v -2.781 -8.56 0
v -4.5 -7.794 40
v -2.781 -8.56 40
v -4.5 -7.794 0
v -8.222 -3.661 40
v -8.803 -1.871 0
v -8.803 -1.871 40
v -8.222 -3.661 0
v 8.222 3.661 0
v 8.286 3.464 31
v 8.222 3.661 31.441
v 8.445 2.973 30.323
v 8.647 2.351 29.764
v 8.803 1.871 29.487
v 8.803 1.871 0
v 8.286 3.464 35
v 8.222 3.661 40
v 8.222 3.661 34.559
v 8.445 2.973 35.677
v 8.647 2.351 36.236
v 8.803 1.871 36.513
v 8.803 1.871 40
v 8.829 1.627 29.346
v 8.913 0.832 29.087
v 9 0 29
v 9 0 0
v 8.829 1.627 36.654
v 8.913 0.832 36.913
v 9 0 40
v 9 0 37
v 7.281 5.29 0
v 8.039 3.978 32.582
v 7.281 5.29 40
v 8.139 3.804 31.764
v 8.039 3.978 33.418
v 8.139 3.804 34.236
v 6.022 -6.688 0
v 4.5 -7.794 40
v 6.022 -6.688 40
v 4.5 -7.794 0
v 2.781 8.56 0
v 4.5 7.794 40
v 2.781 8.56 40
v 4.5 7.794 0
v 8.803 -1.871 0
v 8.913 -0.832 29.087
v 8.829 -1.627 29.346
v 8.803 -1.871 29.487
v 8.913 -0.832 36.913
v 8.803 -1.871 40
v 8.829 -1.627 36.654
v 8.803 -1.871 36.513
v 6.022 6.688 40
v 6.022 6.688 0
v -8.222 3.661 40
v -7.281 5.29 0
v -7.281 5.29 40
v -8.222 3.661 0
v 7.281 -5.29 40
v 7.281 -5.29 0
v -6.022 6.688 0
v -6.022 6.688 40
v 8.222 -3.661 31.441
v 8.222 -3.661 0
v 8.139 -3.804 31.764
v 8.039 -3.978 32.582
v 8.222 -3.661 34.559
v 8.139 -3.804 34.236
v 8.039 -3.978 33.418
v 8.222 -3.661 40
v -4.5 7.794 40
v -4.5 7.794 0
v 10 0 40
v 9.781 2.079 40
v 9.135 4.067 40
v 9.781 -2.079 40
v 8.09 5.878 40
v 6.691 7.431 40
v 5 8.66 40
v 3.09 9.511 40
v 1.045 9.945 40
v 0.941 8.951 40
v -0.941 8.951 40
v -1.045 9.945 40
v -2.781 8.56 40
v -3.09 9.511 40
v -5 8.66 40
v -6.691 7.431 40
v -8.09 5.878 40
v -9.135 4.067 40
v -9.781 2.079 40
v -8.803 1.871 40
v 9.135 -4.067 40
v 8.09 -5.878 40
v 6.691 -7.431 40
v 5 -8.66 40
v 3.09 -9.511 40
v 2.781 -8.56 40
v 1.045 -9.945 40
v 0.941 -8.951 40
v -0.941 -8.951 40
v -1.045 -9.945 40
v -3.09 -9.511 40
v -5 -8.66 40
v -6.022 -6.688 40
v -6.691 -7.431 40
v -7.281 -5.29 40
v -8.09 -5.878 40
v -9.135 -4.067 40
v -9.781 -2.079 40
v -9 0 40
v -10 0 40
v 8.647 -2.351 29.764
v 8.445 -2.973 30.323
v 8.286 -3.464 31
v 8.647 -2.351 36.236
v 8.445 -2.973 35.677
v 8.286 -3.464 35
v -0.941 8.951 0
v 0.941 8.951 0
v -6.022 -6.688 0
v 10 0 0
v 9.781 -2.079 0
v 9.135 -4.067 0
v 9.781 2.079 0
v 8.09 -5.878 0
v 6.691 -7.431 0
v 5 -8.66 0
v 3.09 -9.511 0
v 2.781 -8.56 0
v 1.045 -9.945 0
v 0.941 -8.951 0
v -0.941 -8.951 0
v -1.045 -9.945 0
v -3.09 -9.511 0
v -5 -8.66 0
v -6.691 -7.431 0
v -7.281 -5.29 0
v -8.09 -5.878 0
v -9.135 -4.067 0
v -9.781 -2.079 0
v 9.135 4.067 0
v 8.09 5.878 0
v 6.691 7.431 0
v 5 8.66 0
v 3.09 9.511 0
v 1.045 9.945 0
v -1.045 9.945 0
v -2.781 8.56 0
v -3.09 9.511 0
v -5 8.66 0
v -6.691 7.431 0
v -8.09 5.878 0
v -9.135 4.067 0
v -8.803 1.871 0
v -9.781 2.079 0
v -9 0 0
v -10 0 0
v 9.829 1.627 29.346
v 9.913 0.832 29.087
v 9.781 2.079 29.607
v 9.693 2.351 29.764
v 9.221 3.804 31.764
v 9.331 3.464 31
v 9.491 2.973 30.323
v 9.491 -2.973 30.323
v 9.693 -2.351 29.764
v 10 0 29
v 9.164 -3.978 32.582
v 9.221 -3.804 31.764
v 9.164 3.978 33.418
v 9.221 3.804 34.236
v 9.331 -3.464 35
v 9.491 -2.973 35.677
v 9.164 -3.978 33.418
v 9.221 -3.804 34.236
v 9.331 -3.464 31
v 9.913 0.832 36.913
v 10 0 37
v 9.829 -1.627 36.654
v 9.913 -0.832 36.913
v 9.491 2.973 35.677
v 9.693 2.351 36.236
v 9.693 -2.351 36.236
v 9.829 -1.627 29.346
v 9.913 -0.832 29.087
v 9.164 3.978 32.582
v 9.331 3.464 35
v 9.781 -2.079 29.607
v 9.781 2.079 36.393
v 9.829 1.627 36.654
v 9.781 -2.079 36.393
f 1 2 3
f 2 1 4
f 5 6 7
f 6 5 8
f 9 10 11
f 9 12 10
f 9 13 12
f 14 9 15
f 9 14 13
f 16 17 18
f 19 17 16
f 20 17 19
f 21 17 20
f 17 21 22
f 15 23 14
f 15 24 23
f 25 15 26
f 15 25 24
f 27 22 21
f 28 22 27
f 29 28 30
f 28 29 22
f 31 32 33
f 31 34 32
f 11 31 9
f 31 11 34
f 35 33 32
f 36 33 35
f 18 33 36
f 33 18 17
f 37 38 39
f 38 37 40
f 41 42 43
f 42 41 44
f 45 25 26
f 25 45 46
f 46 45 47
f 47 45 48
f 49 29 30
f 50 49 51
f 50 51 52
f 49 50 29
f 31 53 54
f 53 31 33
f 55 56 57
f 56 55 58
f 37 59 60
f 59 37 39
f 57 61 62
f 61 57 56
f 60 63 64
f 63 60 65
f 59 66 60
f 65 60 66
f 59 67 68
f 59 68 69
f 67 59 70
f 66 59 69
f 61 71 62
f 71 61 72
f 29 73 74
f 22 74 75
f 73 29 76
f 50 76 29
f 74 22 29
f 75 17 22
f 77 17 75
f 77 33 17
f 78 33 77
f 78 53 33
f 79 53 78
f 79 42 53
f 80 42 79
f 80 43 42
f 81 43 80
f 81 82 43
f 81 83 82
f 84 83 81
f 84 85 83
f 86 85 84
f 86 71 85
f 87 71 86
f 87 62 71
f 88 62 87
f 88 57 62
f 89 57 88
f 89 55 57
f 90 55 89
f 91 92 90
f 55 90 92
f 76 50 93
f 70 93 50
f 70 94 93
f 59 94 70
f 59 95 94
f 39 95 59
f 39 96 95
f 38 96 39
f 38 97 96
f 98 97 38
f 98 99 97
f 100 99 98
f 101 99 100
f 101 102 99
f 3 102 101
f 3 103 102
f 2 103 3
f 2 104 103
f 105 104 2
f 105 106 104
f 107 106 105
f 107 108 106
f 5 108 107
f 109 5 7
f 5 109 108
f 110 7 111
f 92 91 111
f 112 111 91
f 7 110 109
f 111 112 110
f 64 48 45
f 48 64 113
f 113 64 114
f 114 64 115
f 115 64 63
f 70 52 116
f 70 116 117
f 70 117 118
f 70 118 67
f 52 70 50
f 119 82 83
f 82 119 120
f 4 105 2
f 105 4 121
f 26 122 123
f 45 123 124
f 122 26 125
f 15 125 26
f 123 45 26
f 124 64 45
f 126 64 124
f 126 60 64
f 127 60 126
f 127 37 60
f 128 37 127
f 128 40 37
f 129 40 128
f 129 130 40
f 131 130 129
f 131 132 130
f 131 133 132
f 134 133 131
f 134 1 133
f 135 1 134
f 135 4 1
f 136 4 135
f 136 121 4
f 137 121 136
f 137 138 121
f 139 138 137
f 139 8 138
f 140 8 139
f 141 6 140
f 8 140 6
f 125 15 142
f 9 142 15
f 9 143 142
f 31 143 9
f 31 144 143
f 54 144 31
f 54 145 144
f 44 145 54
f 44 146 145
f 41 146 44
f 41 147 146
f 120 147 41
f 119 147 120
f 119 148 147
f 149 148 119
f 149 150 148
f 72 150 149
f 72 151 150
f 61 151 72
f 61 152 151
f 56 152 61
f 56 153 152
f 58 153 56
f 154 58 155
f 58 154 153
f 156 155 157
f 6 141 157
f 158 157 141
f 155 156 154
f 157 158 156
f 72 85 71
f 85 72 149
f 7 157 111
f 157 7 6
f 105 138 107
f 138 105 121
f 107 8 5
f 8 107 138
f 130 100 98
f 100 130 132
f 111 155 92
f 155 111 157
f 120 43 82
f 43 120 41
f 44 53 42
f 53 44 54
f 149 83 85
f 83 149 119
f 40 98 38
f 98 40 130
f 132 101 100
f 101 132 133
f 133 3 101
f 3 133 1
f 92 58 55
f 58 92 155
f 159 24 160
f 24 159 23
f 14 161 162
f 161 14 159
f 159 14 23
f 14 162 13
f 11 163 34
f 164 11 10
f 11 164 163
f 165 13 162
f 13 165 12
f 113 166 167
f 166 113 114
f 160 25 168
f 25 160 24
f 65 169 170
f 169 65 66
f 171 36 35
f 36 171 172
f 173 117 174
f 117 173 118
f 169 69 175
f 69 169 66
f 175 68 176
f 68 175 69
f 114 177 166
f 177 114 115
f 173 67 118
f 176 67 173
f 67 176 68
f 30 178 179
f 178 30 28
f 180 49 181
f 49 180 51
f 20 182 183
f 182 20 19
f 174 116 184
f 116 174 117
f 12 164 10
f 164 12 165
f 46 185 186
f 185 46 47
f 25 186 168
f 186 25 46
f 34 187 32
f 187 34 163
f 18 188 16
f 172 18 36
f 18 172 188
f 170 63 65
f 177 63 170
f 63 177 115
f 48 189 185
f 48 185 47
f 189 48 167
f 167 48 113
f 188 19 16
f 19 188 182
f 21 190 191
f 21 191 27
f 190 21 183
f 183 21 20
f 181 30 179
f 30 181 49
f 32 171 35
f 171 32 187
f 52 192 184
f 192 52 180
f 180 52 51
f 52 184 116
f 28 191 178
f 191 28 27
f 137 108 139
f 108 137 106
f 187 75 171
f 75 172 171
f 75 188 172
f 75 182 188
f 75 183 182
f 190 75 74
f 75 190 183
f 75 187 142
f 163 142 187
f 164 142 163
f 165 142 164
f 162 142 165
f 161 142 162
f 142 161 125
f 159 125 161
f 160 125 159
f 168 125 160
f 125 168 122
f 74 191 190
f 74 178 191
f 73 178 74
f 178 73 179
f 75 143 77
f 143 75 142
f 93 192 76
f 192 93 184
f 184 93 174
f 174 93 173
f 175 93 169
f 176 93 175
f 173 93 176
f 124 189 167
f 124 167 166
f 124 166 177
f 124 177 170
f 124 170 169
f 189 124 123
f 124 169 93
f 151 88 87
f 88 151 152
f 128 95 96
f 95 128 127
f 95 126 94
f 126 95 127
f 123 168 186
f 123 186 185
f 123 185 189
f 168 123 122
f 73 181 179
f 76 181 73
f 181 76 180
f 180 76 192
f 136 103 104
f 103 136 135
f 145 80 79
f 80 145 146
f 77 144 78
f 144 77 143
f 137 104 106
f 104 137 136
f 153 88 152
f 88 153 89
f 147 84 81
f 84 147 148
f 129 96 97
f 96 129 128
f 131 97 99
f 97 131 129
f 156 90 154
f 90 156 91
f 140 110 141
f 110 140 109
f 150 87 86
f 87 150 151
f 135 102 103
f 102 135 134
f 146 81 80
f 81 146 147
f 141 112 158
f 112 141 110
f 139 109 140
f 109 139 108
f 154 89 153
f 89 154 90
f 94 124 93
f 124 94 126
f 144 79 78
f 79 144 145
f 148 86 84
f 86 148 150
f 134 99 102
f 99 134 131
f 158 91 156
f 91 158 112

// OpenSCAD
$fn = 30;

module plug_mould(plug_radius = 9, wall = 1, height = 40, pipe_radius = 4, positions = [-4.5, 4.5], bottom = false, $fn = $fn) {
    bottom_offset = bottom ? 3 * wall : 0;
    total_height = height + bottom_offset;
    
    difference() {
        cylinder(r = plug_radius + wall, h = total_height, $fn = $fn);
        union() {
            translate([0, 0, bottom_offset]) cylinder(r = plug_radius, h = height, $fn = $fn);
            if (bottom) {
                for(offset = positions) {
                    translate([offset, 0, 0]) cylinder(r = pipe_radius, h = height);
                }
            }
            translate([0, 0, (height - 10) + (3 * wall)]) rotate([0,90, 0]) cylinder(r = pipe_radius, h = height);
        }
    }
}

module plug_lid(plug_radius = 9, wall = 1, height = 40, pipe_radius = 4, positions = [-4.5, 4.5], $fn = $fn) {
    union() {
        cylinder(r = plug_radius + wall, h = wall);
        cylinder(r = plug_radius - 0.1, h = wall * 2);
        for(offset = positions) {
            translate([offset, 0, wall * 2]) cylinder(r = 2.5, h = wall * 4);
        }
    }
}

plug_mould();
